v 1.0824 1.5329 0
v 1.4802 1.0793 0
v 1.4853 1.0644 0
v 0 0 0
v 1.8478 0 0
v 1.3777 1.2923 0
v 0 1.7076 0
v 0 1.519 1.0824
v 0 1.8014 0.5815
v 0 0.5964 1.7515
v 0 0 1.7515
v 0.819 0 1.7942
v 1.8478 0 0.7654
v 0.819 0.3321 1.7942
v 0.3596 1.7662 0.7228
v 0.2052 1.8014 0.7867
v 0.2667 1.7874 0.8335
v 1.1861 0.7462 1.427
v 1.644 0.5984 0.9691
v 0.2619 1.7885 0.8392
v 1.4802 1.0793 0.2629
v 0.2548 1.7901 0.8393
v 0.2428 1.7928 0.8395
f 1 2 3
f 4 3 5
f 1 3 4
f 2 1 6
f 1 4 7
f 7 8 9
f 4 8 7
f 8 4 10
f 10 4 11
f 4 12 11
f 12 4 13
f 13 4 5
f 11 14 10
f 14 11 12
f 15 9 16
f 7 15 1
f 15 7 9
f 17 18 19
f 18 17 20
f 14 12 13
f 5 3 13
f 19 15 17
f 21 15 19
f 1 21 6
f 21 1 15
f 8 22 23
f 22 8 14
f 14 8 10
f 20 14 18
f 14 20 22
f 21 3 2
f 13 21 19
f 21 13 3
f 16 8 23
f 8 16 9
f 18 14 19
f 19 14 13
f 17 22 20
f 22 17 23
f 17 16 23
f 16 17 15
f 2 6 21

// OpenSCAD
// Generated by generate_scads.py
intersection() {
  rotate([180,45,0]) {
    sphere(r=2);
  }
  cylinder(h=10, r=4, center=true);
  intersection() {
    cube(size=[10,10,30], center=true);
    cube(size=[10,5,5], center=false);
  }
  cylinder(h=15, r=2, center=false);
}
